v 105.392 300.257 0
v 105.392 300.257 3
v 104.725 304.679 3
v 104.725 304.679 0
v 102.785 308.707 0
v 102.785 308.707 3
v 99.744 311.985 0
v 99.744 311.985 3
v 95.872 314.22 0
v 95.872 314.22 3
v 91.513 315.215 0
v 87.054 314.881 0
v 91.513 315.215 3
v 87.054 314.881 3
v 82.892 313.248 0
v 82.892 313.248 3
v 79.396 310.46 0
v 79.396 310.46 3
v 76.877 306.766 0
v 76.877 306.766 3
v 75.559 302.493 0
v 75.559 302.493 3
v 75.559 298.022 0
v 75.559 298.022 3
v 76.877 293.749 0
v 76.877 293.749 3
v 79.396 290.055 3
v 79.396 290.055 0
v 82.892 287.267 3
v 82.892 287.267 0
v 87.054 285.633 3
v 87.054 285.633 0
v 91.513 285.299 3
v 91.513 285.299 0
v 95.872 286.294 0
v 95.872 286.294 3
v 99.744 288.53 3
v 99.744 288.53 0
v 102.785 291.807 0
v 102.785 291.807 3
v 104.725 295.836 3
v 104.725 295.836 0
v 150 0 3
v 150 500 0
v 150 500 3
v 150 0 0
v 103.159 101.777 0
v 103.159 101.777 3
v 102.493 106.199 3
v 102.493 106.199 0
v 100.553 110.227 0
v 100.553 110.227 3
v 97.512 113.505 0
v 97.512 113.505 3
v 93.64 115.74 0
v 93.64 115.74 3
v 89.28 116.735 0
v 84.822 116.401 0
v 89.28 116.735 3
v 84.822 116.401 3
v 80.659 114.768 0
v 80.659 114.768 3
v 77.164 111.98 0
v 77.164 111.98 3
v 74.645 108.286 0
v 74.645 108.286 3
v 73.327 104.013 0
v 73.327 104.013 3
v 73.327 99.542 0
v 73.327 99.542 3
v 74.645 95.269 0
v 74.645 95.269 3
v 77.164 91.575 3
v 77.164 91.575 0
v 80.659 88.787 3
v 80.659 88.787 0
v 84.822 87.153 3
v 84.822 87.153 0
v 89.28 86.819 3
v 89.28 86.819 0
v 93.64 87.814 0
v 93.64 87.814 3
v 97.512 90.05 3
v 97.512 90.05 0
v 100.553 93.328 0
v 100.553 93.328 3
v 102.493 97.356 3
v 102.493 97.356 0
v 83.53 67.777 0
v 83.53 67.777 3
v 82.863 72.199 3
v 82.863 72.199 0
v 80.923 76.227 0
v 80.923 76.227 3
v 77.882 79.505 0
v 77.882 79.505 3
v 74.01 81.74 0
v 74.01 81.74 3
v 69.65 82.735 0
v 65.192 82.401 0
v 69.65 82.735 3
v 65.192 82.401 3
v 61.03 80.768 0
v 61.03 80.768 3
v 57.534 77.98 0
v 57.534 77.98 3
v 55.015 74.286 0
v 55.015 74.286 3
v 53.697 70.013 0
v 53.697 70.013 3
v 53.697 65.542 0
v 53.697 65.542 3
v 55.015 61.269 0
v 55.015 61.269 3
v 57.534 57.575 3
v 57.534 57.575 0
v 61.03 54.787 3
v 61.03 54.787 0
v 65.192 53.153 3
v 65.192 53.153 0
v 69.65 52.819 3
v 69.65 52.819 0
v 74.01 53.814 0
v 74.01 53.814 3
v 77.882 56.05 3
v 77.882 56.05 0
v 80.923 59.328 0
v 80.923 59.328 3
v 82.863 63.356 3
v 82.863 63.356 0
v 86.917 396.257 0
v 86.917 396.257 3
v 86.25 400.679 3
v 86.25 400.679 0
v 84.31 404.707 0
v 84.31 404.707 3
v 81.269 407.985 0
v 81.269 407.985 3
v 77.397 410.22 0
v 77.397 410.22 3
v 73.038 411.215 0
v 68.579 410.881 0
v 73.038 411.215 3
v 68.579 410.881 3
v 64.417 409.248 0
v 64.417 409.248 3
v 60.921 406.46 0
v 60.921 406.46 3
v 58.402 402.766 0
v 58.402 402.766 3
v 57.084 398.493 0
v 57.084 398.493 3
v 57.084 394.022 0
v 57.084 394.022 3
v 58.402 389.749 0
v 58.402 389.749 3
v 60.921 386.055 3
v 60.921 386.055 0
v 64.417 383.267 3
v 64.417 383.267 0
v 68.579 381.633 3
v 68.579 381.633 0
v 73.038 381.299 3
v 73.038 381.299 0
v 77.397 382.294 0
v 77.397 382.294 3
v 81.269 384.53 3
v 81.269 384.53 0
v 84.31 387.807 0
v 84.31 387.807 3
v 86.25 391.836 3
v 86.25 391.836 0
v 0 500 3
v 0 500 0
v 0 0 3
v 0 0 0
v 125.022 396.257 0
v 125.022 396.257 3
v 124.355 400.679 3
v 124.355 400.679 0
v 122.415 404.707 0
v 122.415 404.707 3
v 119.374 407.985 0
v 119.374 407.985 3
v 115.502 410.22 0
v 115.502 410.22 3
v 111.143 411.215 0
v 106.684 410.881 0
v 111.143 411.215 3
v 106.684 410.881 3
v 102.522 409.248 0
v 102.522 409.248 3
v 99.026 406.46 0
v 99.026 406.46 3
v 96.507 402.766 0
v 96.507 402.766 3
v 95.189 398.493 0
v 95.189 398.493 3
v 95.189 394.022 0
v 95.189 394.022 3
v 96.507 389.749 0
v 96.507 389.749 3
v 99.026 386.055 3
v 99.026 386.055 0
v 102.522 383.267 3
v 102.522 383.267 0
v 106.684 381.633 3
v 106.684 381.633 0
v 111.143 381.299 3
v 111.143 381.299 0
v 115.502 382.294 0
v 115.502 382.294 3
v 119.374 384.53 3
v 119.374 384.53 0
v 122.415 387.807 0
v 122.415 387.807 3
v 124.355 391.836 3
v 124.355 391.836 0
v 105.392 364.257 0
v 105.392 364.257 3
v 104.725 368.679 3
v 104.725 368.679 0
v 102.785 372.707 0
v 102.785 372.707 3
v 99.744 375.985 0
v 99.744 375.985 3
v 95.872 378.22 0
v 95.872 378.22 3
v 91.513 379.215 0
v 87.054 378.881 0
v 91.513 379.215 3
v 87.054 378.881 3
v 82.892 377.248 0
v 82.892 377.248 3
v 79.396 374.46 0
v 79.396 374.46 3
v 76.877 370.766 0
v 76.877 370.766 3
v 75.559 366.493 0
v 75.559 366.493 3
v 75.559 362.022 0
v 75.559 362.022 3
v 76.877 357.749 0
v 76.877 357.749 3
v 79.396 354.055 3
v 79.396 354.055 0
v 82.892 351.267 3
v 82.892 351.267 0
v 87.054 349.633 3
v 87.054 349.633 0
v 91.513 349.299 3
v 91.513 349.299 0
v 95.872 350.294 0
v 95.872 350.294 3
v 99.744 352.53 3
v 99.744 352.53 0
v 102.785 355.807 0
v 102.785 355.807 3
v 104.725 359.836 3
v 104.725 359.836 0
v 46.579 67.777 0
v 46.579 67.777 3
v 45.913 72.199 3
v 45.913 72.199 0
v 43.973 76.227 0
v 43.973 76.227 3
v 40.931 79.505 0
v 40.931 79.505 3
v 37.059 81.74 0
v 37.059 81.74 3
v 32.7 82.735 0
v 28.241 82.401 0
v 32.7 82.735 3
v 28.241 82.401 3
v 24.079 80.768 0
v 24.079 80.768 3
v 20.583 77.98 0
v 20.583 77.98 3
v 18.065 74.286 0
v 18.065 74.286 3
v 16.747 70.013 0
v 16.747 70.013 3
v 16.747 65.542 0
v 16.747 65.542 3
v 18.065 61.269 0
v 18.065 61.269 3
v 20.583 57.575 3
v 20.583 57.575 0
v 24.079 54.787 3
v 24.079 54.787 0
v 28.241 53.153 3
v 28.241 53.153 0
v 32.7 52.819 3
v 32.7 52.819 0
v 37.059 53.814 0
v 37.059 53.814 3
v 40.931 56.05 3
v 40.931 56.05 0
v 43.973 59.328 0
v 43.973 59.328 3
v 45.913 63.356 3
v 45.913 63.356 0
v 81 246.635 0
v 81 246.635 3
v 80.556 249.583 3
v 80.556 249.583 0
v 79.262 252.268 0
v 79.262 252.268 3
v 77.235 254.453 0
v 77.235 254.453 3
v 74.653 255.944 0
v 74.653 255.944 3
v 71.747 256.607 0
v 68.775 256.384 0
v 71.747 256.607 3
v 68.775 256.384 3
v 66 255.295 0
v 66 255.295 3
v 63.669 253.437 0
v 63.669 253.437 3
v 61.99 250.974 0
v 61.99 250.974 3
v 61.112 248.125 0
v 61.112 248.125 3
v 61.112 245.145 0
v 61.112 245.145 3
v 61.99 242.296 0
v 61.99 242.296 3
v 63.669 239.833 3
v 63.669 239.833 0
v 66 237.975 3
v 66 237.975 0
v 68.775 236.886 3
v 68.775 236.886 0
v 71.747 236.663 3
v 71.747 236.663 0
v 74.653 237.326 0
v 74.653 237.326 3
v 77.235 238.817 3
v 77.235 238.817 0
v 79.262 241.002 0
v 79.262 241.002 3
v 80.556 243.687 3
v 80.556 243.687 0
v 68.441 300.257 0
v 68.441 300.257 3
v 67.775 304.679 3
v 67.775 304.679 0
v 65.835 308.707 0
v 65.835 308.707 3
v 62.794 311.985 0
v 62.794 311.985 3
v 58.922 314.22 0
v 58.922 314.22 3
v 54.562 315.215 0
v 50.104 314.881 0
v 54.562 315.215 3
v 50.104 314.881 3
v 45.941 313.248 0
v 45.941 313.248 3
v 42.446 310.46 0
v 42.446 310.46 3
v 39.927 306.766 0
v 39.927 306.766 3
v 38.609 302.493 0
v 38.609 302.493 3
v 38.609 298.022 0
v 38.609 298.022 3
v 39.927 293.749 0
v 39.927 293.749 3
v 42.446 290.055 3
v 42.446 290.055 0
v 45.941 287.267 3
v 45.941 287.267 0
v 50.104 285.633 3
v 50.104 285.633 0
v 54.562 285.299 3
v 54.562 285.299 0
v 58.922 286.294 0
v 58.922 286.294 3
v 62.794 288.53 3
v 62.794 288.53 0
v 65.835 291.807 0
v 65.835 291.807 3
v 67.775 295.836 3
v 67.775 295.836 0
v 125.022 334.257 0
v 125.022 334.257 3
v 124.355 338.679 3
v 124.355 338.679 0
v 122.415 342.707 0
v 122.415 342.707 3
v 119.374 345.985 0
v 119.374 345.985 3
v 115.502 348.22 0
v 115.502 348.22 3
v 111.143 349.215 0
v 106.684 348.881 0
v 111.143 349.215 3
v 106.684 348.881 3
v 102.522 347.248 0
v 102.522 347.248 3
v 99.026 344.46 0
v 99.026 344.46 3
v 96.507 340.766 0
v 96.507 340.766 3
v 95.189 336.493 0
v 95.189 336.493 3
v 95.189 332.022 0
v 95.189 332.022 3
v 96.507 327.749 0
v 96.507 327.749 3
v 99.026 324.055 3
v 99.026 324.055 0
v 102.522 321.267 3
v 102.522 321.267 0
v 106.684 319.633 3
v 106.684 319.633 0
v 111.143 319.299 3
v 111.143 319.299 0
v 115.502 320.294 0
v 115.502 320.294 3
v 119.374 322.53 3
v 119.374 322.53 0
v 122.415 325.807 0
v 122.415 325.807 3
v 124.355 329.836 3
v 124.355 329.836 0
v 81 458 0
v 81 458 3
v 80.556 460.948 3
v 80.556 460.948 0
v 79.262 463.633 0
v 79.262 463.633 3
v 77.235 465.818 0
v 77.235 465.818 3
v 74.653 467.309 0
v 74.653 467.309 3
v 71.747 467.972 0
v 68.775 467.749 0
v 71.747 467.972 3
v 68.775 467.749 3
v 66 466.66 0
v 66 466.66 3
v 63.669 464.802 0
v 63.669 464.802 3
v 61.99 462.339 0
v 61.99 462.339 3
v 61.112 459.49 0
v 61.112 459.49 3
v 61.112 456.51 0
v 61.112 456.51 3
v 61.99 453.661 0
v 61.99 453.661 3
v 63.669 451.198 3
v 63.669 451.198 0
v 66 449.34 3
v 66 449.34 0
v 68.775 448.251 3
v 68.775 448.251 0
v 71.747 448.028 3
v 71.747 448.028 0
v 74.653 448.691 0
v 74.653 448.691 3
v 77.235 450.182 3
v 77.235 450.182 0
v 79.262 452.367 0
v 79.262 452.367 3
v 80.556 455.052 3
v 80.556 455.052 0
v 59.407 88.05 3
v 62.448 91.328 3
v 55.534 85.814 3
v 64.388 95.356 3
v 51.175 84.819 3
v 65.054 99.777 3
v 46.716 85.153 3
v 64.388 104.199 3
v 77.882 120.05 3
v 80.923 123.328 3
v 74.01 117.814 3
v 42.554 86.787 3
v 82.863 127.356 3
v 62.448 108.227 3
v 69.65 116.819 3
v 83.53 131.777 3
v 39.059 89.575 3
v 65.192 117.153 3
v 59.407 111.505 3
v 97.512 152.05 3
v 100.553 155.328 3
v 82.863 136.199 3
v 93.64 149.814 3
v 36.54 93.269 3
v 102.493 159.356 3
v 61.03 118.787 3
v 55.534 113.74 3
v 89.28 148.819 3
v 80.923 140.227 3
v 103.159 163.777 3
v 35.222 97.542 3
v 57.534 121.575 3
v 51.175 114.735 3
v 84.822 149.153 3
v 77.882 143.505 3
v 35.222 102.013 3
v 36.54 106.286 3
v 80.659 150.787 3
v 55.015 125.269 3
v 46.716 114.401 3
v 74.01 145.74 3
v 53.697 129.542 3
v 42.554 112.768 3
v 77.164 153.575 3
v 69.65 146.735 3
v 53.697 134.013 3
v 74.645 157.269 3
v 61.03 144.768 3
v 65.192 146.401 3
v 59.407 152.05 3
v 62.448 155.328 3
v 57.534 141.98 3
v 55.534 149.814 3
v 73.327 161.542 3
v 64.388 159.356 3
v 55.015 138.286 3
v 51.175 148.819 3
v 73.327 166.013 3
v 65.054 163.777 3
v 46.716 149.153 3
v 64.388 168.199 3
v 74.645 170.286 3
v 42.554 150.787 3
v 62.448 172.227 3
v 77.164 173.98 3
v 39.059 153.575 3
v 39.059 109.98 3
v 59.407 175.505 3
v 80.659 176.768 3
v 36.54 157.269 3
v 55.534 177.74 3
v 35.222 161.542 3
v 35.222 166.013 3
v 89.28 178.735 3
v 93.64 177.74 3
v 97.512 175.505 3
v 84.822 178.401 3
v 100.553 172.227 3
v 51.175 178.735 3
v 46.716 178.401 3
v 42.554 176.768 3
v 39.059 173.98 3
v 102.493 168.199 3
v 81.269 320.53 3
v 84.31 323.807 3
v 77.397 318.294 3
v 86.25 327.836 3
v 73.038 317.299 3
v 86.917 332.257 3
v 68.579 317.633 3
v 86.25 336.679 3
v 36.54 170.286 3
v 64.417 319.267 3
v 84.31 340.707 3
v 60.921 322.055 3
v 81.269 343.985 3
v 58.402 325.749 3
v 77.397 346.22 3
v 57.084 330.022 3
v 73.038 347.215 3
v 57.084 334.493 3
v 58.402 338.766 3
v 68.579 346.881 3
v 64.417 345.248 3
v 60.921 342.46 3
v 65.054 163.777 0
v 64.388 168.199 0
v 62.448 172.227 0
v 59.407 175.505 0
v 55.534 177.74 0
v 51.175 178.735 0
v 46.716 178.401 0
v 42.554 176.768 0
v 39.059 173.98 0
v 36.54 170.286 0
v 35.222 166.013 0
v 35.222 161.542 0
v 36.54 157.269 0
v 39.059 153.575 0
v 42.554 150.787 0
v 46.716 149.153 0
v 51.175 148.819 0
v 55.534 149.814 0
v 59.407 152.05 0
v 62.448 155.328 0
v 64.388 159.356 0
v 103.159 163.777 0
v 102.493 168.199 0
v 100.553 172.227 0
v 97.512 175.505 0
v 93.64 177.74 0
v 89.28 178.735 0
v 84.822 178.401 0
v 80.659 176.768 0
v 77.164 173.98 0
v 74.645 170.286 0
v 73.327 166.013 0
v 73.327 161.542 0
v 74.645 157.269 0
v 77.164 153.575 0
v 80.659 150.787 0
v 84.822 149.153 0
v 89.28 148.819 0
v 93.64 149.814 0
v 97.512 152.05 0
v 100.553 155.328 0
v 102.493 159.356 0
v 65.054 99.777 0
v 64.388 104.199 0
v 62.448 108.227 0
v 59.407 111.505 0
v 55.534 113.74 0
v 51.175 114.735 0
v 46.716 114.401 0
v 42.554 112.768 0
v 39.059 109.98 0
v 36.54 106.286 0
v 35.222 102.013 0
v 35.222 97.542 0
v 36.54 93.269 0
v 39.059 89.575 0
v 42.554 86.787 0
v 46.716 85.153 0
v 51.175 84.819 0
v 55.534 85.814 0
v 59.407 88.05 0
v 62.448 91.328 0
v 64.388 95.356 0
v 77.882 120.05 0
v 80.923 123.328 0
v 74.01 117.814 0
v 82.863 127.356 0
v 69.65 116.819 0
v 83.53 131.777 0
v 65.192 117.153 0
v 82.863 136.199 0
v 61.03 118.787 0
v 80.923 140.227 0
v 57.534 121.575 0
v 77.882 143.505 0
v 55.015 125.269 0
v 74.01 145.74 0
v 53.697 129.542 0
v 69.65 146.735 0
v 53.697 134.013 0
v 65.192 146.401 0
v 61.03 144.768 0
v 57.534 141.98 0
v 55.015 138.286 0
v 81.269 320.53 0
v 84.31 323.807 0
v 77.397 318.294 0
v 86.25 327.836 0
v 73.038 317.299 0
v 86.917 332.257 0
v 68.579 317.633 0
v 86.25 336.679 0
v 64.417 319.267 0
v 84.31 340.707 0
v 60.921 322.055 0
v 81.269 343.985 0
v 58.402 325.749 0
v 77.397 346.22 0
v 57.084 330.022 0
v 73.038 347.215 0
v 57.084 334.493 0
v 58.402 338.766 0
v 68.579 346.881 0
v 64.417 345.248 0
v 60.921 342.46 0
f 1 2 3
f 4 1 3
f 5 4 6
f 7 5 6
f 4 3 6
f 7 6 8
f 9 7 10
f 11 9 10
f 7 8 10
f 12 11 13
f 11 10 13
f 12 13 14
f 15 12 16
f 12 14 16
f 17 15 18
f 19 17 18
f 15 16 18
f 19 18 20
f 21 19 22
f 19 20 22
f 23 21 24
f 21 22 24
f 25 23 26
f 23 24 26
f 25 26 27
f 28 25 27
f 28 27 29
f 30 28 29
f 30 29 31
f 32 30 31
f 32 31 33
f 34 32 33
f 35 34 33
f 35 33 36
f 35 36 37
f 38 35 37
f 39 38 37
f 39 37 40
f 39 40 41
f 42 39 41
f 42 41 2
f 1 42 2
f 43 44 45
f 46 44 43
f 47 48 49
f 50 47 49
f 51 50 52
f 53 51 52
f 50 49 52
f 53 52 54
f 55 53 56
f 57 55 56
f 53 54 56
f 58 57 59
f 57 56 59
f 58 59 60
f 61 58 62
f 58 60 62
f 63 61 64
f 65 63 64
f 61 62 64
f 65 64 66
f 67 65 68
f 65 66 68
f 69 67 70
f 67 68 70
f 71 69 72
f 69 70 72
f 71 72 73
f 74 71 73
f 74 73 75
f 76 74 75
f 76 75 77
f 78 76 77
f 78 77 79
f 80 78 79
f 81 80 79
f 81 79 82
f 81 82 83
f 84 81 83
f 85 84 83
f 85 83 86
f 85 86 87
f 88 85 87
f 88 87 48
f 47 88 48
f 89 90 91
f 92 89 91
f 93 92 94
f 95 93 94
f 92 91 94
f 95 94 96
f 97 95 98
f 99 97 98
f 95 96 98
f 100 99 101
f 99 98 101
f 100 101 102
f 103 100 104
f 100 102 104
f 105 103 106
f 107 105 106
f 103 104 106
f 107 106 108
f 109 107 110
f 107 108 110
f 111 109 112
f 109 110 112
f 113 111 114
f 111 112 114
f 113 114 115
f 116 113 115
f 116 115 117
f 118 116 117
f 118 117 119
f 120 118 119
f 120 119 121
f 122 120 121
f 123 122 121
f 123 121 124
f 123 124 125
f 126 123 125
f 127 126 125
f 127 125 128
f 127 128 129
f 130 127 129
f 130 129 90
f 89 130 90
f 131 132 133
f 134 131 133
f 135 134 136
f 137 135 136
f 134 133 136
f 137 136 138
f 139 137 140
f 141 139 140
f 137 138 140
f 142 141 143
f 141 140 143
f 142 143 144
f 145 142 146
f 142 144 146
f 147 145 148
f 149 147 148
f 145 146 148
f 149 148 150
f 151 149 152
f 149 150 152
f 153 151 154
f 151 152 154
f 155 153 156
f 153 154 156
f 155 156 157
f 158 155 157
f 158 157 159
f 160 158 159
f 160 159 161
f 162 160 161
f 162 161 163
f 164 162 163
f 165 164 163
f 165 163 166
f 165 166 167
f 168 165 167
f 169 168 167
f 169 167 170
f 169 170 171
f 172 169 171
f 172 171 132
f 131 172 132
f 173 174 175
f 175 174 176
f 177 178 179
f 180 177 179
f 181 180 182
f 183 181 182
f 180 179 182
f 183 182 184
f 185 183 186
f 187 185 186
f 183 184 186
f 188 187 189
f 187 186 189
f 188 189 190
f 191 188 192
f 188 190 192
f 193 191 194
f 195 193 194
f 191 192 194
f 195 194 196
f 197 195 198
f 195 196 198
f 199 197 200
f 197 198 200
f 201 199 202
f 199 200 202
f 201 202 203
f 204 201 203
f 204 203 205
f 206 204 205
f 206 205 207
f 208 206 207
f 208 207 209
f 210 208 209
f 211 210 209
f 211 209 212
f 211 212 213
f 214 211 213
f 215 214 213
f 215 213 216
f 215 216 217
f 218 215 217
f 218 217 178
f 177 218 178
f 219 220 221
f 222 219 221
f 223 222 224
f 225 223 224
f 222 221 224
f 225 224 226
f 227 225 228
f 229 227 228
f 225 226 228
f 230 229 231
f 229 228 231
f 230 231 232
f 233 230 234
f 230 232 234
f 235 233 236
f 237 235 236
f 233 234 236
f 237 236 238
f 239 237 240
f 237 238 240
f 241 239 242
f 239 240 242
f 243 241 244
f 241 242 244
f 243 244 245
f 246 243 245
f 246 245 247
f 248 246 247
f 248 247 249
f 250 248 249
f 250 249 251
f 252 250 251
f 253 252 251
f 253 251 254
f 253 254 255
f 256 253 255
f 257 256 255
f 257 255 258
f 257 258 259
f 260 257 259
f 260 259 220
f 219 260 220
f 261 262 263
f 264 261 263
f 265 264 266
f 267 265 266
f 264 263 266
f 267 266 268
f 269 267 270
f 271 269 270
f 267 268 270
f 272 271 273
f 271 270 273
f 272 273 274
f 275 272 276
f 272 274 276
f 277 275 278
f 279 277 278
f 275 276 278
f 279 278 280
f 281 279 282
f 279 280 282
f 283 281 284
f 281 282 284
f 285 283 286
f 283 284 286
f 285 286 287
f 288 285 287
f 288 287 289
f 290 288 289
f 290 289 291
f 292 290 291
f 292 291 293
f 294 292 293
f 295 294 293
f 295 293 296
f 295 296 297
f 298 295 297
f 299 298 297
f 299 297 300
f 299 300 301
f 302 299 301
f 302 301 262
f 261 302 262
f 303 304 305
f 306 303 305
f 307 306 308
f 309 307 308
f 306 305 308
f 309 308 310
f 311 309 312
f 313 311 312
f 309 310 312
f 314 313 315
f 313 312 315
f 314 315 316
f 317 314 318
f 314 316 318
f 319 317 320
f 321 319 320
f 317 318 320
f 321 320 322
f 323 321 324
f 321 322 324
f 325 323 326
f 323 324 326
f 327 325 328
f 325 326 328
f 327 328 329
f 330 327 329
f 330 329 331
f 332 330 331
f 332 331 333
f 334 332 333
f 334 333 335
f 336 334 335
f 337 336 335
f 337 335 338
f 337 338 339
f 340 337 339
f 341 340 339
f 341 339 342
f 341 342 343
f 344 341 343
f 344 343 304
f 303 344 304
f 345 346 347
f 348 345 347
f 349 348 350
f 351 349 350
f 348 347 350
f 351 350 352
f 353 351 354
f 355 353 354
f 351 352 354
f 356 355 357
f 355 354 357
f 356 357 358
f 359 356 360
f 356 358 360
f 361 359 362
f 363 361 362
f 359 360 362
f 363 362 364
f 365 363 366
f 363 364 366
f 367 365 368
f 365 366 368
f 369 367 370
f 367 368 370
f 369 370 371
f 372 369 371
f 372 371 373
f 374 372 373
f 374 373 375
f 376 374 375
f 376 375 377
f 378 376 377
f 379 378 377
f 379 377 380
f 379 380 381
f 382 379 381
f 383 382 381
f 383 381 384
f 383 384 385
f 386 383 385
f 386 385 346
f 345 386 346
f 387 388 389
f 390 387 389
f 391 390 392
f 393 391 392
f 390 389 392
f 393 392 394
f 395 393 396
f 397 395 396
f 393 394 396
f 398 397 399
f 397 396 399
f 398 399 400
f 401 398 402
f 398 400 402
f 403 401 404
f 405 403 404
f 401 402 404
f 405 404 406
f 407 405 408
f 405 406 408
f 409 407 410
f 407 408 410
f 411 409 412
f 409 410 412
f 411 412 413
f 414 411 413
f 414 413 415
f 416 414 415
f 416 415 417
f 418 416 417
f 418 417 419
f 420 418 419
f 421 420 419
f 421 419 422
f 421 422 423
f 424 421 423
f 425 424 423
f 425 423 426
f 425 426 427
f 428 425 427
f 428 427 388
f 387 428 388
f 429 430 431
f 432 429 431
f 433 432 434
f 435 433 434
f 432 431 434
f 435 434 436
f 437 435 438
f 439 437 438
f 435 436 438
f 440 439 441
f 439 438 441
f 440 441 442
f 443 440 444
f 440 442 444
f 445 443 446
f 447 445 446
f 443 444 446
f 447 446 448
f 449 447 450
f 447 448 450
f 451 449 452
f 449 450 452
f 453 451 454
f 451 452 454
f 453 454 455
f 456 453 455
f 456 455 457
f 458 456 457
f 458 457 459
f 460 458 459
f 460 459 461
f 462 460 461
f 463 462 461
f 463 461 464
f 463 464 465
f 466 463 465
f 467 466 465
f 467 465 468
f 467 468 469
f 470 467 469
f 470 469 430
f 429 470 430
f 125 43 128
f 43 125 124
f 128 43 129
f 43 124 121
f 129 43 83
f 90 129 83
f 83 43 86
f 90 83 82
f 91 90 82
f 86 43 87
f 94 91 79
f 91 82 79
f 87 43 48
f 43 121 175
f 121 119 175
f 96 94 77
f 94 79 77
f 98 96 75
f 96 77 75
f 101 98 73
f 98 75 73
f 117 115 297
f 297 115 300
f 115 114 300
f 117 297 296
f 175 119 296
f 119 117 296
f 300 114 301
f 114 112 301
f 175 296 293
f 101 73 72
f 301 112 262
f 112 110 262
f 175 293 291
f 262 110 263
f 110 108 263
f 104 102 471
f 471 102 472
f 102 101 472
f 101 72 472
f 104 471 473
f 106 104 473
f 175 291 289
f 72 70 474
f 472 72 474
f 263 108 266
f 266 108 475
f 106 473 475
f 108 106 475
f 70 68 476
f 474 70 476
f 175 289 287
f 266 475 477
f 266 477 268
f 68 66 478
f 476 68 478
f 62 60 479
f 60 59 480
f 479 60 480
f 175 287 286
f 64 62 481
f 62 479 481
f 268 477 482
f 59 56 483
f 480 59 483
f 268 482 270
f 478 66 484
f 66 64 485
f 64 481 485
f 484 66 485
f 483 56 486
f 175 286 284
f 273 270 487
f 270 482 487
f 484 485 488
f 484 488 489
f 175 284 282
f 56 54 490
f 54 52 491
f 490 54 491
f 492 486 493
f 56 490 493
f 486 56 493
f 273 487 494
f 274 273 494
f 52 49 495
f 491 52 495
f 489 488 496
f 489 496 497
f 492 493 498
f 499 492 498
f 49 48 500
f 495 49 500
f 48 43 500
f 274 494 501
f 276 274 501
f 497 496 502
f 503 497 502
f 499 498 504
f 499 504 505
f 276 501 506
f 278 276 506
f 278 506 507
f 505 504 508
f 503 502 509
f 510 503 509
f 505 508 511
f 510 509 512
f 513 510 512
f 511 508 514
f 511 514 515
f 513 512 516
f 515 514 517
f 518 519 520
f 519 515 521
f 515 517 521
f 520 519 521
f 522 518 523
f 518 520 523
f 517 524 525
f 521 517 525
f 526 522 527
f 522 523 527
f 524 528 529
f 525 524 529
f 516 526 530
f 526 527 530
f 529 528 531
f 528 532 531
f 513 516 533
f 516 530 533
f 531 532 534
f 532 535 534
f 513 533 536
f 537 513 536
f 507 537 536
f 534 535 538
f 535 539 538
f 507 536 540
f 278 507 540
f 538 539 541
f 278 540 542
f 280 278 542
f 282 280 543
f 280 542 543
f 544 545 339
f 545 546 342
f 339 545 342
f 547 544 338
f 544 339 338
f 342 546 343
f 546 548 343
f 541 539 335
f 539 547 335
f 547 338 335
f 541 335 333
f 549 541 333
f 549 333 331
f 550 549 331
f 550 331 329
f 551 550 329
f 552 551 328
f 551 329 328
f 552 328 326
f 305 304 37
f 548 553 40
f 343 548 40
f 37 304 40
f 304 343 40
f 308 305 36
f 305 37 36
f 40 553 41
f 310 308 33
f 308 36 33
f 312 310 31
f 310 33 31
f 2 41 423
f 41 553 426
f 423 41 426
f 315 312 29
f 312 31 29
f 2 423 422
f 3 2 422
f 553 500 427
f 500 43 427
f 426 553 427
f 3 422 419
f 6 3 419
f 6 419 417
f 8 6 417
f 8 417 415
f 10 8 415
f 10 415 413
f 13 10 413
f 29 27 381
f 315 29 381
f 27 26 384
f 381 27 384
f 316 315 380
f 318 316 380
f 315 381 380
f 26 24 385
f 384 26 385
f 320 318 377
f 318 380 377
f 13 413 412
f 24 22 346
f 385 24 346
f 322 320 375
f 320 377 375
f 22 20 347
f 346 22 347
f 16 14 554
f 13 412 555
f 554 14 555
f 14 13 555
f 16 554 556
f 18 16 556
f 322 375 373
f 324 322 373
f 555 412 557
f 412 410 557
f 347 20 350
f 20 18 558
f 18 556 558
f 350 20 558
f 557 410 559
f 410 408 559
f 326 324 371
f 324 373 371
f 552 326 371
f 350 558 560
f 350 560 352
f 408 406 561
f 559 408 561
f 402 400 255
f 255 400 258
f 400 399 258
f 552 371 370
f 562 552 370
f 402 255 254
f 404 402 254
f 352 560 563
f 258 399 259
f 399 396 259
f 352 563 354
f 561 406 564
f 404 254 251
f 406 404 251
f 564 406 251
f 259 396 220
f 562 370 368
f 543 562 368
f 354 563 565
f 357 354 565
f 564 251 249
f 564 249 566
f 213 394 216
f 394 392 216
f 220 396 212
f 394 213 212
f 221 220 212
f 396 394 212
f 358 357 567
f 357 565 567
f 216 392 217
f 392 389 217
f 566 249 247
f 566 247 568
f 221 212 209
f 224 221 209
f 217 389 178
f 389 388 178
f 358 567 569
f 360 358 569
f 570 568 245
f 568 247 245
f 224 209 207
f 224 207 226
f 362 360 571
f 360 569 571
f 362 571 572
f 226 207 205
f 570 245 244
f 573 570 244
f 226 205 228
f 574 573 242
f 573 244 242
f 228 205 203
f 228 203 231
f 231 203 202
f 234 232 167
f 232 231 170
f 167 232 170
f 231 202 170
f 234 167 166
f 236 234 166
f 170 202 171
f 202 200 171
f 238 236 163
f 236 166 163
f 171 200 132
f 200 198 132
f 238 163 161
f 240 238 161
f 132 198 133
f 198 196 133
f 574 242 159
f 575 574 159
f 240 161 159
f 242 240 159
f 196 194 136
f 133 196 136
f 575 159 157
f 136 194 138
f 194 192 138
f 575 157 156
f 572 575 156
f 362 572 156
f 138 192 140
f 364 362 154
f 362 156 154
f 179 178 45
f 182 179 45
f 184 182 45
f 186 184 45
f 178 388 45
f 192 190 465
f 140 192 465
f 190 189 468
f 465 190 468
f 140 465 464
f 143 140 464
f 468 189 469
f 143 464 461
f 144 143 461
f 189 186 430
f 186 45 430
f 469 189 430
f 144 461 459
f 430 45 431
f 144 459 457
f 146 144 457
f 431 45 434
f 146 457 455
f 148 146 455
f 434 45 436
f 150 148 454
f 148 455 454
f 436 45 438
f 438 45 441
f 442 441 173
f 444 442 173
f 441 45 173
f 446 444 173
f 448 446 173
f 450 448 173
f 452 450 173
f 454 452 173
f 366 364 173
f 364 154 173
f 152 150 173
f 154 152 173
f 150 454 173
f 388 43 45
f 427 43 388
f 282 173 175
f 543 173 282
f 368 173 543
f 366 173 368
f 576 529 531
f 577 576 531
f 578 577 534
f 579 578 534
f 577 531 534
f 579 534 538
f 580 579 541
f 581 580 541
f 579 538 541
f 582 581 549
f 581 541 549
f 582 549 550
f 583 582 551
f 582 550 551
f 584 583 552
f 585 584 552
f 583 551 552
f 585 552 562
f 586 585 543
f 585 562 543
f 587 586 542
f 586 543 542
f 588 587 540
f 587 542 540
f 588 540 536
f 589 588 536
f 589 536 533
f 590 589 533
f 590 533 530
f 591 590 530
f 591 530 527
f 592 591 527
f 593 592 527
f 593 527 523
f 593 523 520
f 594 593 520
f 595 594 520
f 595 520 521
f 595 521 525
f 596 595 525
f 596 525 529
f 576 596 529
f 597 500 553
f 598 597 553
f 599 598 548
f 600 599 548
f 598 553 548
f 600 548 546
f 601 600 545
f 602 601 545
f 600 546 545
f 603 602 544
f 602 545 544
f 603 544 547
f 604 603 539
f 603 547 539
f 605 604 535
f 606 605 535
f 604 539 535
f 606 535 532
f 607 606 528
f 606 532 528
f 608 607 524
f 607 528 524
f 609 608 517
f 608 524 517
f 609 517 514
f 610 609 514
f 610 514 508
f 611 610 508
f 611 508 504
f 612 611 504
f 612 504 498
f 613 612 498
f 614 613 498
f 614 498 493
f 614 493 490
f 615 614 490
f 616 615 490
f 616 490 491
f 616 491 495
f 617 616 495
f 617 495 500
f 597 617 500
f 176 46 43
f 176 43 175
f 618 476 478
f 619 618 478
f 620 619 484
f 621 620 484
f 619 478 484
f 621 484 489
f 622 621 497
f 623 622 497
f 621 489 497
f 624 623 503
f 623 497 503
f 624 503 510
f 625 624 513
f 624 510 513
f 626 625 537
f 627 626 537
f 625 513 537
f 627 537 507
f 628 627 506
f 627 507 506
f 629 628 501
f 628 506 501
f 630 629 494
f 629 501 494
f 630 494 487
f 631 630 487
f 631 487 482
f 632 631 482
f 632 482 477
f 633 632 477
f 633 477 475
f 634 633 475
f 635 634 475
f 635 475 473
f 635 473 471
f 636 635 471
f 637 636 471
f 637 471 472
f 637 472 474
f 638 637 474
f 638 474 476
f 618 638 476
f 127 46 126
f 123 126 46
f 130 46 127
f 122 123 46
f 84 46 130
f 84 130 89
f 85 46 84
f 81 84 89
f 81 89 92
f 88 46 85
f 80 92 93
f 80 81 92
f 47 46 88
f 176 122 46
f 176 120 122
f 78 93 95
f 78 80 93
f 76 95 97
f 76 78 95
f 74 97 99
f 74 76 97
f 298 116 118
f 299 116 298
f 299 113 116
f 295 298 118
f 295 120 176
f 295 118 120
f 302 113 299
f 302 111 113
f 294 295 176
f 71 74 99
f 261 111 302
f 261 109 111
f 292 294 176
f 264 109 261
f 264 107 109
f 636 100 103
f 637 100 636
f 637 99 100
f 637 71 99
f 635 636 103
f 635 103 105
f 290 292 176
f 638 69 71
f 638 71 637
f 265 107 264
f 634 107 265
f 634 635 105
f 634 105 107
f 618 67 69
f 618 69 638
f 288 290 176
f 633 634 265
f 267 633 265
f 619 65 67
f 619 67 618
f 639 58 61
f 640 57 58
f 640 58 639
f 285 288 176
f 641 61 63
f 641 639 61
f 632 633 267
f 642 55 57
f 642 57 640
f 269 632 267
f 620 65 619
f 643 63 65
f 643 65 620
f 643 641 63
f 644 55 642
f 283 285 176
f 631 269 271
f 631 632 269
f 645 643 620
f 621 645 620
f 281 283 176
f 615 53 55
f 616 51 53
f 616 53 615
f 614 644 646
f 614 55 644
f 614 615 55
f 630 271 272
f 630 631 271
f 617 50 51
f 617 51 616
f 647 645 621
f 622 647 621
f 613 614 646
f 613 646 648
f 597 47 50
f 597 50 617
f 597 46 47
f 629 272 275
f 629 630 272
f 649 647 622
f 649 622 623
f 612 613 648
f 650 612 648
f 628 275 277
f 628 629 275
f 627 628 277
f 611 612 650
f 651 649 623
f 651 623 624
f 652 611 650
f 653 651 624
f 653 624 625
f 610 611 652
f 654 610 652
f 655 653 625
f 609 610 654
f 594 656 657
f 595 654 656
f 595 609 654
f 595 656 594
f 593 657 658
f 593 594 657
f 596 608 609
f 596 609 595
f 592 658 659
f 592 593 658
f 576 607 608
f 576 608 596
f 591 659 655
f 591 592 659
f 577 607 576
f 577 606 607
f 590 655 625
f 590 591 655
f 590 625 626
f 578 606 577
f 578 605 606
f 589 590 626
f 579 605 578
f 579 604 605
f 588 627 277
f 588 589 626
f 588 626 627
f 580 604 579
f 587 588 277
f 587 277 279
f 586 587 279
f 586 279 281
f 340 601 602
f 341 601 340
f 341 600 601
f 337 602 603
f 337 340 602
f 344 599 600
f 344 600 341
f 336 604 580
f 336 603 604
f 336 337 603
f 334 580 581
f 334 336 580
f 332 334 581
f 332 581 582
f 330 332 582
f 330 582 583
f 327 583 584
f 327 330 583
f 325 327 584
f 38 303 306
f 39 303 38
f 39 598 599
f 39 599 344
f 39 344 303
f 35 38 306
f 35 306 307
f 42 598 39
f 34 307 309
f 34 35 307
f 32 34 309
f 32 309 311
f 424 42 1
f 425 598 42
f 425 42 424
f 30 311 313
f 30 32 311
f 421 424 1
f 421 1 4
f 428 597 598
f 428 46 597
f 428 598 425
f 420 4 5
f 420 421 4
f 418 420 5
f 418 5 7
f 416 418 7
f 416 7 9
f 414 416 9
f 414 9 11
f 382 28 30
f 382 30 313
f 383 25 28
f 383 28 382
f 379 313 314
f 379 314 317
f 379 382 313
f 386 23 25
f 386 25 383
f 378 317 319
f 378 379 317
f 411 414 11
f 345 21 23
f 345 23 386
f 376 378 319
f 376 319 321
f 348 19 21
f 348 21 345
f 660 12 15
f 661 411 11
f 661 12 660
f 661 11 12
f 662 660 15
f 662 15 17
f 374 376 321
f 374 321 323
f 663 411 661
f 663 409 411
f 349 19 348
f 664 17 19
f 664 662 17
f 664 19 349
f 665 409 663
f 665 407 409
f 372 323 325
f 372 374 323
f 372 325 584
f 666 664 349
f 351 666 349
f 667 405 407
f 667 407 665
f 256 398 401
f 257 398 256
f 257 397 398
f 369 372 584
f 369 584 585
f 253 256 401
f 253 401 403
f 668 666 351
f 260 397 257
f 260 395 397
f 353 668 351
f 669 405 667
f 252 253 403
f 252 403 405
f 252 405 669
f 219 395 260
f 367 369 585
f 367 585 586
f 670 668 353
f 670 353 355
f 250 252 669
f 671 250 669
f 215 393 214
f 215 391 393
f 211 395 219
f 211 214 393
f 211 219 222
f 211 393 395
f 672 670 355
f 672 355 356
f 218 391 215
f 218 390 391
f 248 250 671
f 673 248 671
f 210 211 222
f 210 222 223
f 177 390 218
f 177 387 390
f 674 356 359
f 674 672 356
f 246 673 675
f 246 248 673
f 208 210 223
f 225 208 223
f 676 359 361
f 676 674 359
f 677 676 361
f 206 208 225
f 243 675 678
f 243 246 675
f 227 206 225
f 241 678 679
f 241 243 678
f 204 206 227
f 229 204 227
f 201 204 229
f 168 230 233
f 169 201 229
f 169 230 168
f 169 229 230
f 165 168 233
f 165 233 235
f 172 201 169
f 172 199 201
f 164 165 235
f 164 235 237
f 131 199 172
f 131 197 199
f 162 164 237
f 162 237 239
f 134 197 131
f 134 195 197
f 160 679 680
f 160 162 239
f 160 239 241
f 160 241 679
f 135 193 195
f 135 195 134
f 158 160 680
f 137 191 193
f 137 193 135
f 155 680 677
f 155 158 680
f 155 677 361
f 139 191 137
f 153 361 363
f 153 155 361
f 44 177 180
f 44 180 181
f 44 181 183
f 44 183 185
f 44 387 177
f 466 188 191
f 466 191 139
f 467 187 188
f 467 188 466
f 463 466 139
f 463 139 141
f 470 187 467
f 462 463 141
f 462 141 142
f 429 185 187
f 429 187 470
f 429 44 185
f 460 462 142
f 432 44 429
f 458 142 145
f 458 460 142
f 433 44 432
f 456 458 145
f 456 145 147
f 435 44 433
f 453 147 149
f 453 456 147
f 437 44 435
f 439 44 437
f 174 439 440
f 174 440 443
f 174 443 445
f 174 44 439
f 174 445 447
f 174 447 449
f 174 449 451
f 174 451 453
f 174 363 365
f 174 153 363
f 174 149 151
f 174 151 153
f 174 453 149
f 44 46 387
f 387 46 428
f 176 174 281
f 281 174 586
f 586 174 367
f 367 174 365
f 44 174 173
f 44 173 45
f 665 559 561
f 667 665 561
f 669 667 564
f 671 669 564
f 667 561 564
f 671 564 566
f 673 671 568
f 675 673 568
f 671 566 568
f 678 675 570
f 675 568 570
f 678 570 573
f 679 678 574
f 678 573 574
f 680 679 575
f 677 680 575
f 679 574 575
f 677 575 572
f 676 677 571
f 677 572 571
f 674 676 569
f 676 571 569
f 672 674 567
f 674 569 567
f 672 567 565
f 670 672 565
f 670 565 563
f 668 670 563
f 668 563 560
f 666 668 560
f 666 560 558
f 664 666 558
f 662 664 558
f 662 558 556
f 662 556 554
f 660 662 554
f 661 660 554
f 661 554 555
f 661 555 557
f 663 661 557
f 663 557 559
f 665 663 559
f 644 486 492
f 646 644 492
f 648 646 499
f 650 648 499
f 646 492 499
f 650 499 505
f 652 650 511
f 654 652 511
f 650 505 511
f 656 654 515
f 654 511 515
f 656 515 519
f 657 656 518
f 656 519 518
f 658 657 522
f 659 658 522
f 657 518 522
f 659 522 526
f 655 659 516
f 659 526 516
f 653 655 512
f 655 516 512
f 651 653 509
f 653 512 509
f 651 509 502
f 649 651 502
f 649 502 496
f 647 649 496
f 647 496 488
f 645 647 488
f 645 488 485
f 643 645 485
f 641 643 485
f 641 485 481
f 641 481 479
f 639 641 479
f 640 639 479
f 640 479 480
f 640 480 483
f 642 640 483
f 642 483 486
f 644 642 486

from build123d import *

# Parameters (mm, degrees)
PAD_DEPTH     = 3
SKETCH001_R   = 15
SKETCH001_R_2 = 10
POCKET_DEPTH  = 3.001


with BuildPart() as part:
    # Sketch → Pad (new body)
    with BuildSketch(Plane.XY):
        Polygon((0, 500), (150, 500), (150, 0), (0, 0), (0, 250), align=None)
    extrude(amount=PAD_DEPTH)

    # Sketch001 (on Face7 of Pad) → Pocket (cut, through all)
    with BuildSketch(Plane.XY.offset(3)):
        with Locations((31.579084, 67.777323)):
            Circle(SKETCH001_R)
        with Locations((50.054292, 99.777323)):
            Circle(SKETCH001_R)
        with Locations((68.529501, 131.777323)):
            Circle(SKETCH001_R)
        with Locations((50.054292, 163.777323)):
            Circle(SKETCH001_R)
        with Locations((71, 246.635039)):
            Circle(SKETCH001_R_2)
        with Locations((68.529501, 67.777323)):
            Circle(SKETCH001_R)
        with Locations((88.15941, 101.777323)):
            Circle(SKETCH001_R)
        with Locations((88.15941, 163.777323)):
            Circle(SKETCH001_R)
        with Locations((53.441466, 300.257294)):
            Circle(SKETCH001_R)
        with Locations((71.916674, 332.257294)):
            Circle(SKETCH001_R)
        with Locations((90.391883, 364.257294)):
            Circle(SKETCH001_R)
        with Locations((71.916674, 396.257294)):
            Circle(SKETCH001_R)
        with Locations((71, 458)):
            Circle(SKETCH001_R_2)
        with Locations((90.391883, 300.257294)):
            Circle(SKETCH001_R)
        with Locations((110.021792, 334.257294)):
            Circle(SKETCH001_R)
        with Locations((110.021792, 396.257294)):
            Circle(SKETCH001_R)
    extrude(amount=-POCKET_DEPTH, mode=Mode.SUBTRACT)


solid = part.part
